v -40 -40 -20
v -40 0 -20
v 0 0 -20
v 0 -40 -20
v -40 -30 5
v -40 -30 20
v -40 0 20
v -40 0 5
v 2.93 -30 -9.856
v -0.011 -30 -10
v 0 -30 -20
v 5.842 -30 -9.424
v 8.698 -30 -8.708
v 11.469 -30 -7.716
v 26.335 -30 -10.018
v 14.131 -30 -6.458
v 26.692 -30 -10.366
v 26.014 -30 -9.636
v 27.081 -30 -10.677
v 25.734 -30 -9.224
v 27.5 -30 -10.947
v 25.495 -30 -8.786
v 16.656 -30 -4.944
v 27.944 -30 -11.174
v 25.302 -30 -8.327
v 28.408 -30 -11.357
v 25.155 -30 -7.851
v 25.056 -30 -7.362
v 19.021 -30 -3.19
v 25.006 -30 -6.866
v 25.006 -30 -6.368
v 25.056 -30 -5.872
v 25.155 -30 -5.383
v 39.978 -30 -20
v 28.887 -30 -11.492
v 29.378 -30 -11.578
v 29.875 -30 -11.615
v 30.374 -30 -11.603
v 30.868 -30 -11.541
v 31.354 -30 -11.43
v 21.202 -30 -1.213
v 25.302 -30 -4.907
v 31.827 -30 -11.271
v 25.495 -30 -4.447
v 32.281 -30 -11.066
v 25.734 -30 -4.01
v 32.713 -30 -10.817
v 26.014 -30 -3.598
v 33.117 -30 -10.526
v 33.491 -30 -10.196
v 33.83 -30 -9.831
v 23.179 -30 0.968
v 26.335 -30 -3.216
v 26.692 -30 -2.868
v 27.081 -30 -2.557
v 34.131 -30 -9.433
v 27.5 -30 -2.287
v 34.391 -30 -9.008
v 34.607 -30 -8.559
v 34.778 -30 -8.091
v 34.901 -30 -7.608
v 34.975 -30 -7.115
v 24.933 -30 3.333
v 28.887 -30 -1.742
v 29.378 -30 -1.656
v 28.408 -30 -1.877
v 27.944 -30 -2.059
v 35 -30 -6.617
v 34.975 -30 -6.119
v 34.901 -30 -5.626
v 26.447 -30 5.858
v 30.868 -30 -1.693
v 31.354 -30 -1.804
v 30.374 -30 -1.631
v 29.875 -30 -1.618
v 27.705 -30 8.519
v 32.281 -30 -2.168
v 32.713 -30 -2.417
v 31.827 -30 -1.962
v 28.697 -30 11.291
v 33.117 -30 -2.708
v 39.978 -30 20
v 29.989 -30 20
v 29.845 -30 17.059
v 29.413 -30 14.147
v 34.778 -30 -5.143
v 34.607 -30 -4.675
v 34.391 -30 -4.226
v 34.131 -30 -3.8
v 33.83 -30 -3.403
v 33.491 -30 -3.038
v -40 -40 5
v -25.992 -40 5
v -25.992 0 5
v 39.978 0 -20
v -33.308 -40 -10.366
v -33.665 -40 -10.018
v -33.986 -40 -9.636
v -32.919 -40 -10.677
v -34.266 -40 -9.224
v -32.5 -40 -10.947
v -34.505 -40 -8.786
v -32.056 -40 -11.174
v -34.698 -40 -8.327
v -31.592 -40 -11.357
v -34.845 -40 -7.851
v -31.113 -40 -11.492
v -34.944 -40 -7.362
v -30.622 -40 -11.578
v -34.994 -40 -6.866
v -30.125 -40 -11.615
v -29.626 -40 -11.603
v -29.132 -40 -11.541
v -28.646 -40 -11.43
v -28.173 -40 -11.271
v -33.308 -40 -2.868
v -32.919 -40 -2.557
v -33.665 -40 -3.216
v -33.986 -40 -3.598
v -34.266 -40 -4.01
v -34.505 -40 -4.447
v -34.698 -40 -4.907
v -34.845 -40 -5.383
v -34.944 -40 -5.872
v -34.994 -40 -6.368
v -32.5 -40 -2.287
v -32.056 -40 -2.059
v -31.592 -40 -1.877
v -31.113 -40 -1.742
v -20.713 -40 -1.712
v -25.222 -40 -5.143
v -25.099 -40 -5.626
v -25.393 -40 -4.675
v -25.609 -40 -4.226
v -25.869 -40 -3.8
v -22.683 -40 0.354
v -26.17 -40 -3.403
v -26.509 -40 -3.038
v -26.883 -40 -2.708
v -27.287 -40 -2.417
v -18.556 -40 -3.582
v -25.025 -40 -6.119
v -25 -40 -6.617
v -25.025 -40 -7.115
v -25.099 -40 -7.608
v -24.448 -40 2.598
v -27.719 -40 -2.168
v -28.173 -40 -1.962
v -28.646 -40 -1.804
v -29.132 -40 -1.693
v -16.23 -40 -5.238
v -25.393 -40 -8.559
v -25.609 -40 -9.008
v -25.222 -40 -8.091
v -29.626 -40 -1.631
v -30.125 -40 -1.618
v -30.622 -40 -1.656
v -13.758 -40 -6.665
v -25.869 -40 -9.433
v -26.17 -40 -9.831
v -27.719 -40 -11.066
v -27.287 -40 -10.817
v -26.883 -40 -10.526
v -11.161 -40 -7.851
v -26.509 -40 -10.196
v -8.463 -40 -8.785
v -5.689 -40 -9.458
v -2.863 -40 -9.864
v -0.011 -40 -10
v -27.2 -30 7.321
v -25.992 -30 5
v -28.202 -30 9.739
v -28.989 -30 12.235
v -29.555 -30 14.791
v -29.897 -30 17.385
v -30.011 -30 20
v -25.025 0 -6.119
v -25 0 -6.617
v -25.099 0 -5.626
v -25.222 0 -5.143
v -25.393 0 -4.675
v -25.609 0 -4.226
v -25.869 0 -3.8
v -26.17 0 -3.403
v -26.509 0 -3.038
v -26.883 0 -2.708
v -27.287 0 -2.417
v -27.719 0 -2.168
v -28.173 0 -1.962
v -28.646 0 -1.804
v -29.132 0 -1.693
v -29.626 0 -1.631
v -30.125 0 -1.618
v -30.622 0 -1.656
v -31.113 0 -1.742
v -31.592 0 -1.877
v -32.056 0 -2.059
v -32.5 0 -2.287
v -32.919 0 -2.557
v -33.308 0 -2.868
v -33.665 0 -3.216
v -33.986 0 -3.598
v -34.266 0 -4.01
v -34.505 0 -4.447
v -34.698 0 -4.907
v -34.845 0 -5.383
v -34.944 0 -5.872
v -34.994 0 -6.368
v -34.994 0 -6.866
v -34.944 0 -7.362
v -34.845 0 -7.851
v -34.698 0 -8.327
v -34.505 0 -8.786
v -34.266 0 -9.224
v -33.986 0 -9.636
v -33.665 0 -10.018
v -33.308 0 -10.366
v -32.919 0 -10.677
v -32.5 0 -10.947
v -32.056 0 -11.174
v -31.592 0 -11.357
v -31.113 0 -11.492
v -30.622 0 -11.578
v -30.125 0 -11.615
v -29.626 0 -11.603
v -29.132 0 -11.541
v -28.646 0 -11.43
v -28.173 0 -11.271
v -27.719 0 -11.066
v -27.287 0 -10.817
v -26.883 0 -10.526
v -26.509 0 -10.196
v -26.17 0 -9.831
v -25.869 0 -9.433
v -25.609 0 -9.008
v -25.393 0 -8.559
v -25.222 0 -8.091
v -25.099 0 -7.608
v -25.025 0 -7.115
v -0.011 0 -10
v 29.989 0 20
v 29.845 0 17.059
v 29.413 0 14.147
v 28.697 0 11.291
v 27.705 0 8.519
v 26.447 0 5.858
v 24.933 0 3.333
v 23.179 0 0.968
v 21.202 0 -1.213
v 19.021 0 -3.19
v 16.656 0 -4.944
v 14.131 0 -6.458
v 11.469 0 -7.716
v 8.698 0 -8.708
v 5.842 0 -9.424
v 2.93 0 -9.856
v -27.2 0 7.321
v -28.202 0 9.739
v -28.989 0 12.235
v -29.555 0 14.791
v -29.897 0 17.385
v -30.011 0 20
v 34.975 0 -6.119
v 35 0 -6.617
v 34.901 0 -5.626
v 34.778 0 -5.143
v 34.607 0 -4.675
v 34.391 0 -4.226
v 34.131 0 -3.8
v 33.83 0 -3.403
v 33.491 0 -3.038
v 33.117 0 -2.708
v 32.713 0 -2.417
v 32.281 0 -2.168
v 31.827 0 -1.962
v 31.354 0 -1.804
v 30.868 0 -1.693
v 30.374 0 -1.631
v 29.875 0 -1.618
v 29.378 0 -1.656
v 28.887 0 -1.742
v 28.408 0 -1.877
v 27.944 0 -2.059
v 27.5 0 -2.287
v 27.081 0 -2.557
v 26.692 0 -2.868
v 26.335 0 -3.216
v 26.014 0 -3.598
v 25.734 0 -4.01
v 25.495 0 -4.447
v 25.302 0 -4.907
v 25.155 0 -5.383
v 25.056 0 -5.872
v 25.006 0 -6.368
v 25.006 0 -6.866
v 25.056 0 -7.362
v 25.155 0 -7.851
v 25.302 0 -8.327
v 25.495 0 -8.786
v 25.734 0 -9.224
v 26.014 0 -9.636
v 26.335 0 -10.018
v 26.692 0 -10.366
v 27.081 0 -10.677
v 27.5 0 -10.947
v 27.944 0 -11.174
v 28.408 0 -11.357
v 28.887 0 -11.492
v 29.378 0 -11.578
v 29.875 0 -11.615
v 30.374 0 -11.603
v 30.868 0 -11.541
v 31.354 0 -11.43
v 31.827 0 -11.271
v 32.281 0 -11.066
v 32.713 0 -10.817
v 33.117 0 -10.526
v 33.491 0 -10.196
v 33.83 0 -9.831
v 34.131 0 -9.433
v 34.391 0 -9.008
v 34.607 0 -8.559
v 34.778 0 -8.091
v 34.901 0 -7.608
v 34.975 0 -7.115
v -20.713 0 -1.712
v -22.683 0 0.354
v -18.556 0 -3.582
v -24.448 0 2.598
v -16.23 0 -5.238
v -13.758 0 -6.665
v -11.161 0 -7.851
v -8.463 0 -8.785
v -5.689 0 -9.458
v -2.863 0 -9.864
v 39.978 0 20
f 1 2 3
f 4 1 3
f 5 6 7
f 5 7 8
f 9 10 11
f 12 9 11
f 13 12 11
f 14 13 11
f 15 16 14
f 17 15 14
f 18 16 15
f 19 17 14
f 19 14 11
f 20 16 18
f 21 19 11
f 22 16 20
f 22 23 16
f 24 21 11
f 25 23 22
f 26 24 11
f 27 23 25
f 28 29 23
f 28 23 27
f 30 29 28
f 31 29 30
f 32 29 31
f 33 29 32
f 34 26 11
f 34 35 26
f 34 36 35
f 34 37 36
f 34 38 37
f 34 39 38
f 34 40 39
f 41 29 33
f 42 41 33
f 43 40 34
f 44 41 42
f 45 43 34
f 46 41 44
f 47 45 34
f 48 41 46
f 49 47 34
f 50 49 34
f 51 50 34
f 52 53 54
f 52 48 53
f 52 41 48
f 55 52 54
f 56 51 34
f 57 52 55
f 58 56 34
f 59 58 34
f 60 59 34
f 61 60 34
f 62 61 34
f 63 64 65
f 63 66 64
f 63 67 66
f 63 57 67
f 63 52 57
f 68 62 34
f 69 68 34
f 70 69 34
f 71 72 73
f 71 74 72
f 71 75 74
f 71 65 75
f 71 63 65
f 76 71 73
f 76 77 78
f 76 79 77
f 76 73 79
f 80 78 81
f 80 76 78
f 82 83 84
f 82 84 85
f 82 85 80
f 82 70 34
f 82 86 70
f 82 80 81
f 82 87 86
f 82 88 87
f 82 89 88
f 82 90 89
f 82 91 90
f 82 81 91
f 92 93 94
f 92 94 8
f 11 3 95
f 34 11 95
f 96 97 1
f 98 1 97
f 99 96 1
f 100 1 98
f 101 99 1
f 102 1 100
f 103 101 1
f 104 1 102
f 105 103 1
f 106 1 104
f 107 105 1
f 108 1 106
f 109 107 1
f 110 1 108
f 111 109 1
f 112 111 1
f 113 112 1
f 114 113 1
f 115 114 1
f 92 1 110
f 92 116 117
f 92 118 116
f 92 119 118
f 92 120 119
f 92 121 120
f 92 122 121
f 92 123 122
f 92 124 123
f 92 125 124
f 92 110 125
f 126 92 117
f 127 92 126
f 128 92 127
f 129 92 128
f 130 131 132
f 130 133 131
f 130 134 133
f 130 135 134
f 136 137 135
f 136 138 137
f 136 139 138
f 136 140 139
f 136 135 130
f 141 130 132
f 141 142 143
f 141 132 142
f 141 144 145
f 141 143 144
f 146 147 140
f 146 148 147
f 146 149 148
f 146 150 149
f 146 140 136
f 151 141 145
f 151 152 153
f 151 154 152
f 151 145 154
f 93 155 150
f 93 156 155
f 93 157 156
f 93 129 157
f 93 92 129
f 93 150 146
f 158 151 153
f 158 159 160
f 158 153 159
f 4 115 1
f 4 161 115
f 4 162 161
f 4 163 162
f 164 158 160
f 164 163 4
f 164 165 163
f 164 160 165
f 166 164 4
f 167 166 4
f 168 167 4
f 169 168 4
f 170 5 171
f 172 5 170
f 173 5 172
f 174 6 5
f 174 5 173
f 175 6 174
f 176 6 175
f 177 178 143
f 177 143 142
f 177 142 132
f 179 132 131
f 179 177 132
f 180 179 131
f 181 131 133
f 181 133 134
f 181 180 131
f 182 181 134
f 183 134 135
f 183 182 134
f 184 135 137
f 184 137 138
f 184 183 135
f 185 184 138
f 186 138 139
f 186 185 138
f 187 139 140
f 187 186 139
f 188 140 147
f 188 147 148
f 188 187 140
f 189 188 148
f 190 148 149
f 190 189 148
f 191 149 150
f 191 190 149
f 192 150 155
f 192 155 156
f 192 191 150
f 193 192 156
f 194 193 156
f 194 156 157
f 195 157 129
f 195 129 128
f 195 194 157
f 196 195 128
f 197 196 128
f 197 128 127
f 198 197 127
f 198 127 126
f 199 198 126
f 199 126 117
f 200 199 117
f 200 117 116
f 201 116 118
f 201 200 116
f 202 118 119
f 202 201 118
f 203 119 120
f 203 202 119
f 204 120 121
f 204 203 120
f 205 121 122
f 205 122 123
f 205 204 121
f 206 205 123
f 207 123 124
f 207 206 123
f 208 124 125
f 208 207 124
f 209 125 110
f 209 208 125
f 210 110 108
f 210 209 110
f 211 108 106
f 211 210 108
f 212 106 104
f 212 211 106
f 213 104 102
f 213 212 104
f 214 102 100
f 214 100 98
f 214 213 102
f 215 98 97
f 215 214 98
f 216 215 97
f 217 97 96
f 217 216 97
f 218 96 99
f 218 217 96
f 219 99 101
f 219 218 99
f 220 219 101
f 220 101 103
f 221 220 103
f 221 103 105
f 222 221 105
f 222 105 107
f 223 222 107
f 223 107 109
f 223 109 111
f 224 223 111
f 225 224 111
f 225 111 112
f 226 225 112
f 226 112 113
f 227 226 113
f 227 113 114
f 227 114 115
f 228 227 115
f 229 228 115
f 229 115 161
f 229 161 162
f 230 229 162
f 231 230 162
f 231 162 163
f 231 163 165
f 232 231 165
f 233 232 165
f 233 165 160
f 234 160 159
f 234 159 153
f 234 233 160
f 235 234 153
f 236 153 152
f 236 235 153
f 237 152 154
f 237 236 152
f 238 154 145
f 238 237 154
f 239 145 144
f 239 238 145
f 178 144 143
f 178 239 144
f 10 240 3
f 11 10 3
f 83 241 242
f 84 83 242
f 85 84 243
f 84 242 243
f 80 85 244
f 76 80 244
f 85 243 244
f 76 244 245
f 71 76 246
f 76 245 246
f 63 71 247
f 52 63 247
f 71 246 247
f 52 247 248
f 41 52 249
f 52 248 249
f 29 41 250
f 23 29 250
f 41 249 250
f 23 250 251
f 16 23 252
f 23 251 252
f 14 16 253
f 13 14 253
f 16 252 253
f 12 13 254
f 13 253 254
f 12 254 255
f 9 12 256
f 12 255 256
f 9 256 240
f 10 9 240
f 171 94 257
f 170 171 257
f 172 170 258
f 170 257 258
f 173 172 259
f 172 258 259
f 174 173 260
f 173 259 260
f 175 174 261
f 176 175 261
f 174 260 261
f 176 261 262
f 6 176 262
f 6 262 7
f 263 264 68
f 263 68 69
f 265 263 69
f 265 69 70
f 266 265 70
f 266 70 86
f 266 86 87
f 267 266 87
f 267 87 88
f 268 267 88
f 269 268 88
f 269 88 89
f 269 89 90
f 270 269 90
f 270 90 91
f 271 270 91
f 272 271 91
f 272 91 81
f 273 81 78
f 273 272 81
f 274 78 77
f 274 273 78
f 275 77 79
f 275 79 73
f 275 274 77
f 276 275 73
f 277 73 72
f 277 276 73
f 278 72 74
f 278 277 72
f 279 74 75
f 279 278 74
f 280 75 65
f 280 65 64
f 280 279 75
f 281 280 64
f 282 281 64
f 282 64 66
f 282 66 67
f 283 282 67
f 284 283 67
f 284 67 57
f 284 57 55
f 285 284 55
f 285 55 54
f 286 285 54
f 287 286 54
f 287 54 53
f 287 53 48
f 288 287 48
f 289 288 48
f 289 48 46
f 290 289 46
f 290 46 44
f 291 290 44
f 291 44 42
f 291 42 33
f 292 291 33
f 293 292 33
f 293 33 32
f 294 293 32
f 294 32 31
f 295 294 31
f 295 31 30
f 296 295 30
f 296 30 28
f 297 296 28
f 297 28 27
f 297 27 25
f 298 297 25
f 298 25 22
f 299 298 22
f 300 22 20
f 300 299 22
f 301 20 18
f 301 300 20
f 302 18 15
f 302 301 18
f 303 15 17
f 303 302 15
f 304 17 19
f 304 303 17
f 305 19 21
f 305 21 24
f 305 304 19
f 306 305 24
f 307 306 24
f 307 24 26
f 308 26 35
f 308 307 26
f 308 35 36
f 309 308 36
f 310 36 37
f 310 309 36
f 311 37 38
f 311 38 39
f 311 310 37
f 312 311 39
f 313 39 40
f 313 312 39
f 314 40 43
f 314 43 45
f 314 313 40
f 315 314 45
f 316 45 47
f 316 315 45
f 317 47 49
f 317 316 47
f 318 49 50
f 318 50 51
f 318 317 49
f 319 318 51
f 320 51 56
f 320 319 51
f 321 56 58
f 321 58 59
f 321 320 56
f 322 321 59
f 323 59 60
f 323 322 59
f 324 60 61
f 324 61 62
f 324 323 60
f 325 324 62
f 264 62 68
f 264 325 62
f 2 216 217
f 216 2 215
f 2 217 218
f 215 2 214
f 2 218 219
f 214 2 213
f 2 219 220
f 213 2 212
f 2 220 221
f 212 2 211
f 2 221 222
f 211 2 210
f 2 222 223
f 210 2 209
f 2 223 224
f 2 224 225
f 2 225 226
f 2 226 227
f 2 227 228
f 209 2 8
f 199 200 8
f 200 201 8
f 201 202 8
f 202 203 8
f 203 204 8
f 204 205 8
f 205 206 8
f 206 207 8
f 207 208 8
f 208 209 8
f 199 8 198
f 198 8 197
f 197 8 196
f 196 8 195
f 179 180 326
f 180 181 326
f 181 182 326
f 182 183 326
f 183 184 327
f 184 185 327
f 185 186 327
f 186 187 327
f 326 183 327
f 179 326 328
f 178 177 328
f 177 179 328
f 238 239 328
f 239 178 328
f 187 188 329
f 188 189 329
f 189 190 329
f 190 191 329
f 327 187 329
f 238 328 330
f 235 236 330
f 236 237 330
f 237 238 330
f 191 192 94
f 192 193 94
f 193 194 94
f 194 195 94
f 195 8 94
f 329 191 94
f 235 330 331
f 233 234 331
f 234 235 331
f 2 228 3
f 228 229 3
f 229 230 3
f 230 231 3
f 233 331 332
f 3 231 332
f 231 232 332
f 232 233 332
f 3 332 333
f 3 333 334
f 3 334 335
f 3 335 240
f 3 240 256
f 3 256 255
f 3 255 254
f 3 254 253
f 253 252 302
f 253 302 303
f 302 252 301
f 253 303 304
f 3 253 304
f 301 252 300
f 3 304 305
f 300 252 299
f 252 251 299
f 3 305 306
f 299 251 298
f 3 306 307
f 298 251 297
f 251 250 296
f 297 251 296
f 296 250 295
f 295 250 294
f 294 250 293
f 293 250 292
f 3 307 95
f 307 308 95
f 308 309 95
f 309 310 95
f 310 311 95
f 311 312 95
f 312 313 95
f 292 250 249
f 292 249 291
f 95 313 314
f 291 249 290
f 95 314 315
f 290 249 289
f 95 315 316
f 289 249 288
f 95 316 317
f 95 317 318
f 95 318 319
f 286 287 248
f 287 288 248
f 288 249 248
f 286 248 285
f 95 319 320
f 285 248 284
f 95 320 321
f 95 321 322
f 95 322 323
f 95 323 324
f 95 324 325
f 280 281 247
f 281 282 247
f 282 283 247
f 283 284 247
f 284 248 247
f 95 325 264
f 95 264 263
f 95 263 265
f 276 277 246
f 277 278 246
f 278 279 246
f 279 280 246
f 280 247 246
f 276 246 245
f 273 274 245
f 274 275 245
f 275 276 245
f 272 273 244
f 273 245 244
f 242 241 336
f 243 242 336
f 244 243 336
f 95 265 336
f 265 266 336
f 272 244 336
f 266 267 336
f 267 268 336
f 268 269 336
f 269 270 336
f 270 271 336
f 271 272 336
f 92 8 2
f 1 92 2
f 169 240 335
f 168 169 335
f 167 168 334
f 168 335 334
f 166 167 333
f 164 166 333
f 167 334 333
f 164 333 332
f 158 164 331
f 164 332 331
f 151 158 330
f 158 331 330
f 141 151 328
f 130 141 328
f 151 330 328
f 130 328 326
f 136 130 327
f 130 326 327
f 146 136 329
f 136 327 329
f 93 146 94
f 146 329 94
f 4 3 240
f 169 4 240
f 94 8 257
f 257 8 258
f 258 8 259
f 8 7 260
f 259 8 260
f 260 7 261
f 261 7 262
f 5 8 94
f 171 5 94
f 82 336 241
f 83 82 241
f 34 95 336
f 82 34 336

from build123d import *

# Parameters (mm, degrees)
F0_R     = 5
F1_DEPTH = 25
F2_DEPTH = 30
F3_DEPTH = 40


with BuildPart() as f1:
    # F0 (on Front) → F1 (new body)
    with BuildSketch(Plane.XZ):
        with BuildLine():
            Line((-0.01101, -10), (0, -20))
            Line((0, -20), (39.977979, -20))
            Line((39.977979, -20), (39.977979, 20))
            Line((39.977979, 20), (29.98899, 20))
            ThreePointArc((29.98899, 20), (21.202193, -1.213203), (-0.01101, -10))
        make_face()
        with Locations((30, -6.616864)):
            Circle(F0_R, mode=Mode.SUBTRACT)
    extrude(amount=F1_DEPTH)

    # F0 (on Front) → F2 (join)
    with BuildSketch(Plane.XZ):
        with BuildLine():
            Line((-0.01101, -10), (0, -20))
            Line((0, -20), (39.977979, -20))
            Line((39.977979, -20), (39.977979, 20))
            Line((39.977979, 20), (29.98899, 20))
            ThreePointArc((29.98899, 20), (21.202193, -1.213203), (-0.01101, -10))
        make_face()
        with Locations((30, -6.616864)):
            Circle(F0_R, mode=Mode.SUBTRACT)
        with BuildLine():
            Line((-30.01101, 20), (-40, 20))
            Line((-40, 20), (-40, 5))
            Line((-40, 5), (-25.991772, 5))
            ThreePointArc((-25.991772, 5), (-28.988785, 12.235429), (-30.01101, 20))
        make_face()
    extrude(amount=F2_DEPTH)


with BuildPart() as f3:
    # F0 (on Front) → F3 (new body)
    with BuildSketch(Plane.XZ):
        with BuildLine():
            Line((-25.991772, 5), (-40, 5))
            Line((-40, 5), (-40, -20))
            Line((-40, -20), (0, -20))
            Line((0, -20), (-0.01101, -10))
            ThreePointArc((-0.01101, -10), (-15.01101, -5.980762), (-25.991772, 5))
        make_face()
        with Locations((-30, -6.616864)):
            Circle(F0_R, mode=Mode.SUBTRACT)
    extrude(amount=F3_DEPTH)


solid = Compound([f1.part, f3.part])
